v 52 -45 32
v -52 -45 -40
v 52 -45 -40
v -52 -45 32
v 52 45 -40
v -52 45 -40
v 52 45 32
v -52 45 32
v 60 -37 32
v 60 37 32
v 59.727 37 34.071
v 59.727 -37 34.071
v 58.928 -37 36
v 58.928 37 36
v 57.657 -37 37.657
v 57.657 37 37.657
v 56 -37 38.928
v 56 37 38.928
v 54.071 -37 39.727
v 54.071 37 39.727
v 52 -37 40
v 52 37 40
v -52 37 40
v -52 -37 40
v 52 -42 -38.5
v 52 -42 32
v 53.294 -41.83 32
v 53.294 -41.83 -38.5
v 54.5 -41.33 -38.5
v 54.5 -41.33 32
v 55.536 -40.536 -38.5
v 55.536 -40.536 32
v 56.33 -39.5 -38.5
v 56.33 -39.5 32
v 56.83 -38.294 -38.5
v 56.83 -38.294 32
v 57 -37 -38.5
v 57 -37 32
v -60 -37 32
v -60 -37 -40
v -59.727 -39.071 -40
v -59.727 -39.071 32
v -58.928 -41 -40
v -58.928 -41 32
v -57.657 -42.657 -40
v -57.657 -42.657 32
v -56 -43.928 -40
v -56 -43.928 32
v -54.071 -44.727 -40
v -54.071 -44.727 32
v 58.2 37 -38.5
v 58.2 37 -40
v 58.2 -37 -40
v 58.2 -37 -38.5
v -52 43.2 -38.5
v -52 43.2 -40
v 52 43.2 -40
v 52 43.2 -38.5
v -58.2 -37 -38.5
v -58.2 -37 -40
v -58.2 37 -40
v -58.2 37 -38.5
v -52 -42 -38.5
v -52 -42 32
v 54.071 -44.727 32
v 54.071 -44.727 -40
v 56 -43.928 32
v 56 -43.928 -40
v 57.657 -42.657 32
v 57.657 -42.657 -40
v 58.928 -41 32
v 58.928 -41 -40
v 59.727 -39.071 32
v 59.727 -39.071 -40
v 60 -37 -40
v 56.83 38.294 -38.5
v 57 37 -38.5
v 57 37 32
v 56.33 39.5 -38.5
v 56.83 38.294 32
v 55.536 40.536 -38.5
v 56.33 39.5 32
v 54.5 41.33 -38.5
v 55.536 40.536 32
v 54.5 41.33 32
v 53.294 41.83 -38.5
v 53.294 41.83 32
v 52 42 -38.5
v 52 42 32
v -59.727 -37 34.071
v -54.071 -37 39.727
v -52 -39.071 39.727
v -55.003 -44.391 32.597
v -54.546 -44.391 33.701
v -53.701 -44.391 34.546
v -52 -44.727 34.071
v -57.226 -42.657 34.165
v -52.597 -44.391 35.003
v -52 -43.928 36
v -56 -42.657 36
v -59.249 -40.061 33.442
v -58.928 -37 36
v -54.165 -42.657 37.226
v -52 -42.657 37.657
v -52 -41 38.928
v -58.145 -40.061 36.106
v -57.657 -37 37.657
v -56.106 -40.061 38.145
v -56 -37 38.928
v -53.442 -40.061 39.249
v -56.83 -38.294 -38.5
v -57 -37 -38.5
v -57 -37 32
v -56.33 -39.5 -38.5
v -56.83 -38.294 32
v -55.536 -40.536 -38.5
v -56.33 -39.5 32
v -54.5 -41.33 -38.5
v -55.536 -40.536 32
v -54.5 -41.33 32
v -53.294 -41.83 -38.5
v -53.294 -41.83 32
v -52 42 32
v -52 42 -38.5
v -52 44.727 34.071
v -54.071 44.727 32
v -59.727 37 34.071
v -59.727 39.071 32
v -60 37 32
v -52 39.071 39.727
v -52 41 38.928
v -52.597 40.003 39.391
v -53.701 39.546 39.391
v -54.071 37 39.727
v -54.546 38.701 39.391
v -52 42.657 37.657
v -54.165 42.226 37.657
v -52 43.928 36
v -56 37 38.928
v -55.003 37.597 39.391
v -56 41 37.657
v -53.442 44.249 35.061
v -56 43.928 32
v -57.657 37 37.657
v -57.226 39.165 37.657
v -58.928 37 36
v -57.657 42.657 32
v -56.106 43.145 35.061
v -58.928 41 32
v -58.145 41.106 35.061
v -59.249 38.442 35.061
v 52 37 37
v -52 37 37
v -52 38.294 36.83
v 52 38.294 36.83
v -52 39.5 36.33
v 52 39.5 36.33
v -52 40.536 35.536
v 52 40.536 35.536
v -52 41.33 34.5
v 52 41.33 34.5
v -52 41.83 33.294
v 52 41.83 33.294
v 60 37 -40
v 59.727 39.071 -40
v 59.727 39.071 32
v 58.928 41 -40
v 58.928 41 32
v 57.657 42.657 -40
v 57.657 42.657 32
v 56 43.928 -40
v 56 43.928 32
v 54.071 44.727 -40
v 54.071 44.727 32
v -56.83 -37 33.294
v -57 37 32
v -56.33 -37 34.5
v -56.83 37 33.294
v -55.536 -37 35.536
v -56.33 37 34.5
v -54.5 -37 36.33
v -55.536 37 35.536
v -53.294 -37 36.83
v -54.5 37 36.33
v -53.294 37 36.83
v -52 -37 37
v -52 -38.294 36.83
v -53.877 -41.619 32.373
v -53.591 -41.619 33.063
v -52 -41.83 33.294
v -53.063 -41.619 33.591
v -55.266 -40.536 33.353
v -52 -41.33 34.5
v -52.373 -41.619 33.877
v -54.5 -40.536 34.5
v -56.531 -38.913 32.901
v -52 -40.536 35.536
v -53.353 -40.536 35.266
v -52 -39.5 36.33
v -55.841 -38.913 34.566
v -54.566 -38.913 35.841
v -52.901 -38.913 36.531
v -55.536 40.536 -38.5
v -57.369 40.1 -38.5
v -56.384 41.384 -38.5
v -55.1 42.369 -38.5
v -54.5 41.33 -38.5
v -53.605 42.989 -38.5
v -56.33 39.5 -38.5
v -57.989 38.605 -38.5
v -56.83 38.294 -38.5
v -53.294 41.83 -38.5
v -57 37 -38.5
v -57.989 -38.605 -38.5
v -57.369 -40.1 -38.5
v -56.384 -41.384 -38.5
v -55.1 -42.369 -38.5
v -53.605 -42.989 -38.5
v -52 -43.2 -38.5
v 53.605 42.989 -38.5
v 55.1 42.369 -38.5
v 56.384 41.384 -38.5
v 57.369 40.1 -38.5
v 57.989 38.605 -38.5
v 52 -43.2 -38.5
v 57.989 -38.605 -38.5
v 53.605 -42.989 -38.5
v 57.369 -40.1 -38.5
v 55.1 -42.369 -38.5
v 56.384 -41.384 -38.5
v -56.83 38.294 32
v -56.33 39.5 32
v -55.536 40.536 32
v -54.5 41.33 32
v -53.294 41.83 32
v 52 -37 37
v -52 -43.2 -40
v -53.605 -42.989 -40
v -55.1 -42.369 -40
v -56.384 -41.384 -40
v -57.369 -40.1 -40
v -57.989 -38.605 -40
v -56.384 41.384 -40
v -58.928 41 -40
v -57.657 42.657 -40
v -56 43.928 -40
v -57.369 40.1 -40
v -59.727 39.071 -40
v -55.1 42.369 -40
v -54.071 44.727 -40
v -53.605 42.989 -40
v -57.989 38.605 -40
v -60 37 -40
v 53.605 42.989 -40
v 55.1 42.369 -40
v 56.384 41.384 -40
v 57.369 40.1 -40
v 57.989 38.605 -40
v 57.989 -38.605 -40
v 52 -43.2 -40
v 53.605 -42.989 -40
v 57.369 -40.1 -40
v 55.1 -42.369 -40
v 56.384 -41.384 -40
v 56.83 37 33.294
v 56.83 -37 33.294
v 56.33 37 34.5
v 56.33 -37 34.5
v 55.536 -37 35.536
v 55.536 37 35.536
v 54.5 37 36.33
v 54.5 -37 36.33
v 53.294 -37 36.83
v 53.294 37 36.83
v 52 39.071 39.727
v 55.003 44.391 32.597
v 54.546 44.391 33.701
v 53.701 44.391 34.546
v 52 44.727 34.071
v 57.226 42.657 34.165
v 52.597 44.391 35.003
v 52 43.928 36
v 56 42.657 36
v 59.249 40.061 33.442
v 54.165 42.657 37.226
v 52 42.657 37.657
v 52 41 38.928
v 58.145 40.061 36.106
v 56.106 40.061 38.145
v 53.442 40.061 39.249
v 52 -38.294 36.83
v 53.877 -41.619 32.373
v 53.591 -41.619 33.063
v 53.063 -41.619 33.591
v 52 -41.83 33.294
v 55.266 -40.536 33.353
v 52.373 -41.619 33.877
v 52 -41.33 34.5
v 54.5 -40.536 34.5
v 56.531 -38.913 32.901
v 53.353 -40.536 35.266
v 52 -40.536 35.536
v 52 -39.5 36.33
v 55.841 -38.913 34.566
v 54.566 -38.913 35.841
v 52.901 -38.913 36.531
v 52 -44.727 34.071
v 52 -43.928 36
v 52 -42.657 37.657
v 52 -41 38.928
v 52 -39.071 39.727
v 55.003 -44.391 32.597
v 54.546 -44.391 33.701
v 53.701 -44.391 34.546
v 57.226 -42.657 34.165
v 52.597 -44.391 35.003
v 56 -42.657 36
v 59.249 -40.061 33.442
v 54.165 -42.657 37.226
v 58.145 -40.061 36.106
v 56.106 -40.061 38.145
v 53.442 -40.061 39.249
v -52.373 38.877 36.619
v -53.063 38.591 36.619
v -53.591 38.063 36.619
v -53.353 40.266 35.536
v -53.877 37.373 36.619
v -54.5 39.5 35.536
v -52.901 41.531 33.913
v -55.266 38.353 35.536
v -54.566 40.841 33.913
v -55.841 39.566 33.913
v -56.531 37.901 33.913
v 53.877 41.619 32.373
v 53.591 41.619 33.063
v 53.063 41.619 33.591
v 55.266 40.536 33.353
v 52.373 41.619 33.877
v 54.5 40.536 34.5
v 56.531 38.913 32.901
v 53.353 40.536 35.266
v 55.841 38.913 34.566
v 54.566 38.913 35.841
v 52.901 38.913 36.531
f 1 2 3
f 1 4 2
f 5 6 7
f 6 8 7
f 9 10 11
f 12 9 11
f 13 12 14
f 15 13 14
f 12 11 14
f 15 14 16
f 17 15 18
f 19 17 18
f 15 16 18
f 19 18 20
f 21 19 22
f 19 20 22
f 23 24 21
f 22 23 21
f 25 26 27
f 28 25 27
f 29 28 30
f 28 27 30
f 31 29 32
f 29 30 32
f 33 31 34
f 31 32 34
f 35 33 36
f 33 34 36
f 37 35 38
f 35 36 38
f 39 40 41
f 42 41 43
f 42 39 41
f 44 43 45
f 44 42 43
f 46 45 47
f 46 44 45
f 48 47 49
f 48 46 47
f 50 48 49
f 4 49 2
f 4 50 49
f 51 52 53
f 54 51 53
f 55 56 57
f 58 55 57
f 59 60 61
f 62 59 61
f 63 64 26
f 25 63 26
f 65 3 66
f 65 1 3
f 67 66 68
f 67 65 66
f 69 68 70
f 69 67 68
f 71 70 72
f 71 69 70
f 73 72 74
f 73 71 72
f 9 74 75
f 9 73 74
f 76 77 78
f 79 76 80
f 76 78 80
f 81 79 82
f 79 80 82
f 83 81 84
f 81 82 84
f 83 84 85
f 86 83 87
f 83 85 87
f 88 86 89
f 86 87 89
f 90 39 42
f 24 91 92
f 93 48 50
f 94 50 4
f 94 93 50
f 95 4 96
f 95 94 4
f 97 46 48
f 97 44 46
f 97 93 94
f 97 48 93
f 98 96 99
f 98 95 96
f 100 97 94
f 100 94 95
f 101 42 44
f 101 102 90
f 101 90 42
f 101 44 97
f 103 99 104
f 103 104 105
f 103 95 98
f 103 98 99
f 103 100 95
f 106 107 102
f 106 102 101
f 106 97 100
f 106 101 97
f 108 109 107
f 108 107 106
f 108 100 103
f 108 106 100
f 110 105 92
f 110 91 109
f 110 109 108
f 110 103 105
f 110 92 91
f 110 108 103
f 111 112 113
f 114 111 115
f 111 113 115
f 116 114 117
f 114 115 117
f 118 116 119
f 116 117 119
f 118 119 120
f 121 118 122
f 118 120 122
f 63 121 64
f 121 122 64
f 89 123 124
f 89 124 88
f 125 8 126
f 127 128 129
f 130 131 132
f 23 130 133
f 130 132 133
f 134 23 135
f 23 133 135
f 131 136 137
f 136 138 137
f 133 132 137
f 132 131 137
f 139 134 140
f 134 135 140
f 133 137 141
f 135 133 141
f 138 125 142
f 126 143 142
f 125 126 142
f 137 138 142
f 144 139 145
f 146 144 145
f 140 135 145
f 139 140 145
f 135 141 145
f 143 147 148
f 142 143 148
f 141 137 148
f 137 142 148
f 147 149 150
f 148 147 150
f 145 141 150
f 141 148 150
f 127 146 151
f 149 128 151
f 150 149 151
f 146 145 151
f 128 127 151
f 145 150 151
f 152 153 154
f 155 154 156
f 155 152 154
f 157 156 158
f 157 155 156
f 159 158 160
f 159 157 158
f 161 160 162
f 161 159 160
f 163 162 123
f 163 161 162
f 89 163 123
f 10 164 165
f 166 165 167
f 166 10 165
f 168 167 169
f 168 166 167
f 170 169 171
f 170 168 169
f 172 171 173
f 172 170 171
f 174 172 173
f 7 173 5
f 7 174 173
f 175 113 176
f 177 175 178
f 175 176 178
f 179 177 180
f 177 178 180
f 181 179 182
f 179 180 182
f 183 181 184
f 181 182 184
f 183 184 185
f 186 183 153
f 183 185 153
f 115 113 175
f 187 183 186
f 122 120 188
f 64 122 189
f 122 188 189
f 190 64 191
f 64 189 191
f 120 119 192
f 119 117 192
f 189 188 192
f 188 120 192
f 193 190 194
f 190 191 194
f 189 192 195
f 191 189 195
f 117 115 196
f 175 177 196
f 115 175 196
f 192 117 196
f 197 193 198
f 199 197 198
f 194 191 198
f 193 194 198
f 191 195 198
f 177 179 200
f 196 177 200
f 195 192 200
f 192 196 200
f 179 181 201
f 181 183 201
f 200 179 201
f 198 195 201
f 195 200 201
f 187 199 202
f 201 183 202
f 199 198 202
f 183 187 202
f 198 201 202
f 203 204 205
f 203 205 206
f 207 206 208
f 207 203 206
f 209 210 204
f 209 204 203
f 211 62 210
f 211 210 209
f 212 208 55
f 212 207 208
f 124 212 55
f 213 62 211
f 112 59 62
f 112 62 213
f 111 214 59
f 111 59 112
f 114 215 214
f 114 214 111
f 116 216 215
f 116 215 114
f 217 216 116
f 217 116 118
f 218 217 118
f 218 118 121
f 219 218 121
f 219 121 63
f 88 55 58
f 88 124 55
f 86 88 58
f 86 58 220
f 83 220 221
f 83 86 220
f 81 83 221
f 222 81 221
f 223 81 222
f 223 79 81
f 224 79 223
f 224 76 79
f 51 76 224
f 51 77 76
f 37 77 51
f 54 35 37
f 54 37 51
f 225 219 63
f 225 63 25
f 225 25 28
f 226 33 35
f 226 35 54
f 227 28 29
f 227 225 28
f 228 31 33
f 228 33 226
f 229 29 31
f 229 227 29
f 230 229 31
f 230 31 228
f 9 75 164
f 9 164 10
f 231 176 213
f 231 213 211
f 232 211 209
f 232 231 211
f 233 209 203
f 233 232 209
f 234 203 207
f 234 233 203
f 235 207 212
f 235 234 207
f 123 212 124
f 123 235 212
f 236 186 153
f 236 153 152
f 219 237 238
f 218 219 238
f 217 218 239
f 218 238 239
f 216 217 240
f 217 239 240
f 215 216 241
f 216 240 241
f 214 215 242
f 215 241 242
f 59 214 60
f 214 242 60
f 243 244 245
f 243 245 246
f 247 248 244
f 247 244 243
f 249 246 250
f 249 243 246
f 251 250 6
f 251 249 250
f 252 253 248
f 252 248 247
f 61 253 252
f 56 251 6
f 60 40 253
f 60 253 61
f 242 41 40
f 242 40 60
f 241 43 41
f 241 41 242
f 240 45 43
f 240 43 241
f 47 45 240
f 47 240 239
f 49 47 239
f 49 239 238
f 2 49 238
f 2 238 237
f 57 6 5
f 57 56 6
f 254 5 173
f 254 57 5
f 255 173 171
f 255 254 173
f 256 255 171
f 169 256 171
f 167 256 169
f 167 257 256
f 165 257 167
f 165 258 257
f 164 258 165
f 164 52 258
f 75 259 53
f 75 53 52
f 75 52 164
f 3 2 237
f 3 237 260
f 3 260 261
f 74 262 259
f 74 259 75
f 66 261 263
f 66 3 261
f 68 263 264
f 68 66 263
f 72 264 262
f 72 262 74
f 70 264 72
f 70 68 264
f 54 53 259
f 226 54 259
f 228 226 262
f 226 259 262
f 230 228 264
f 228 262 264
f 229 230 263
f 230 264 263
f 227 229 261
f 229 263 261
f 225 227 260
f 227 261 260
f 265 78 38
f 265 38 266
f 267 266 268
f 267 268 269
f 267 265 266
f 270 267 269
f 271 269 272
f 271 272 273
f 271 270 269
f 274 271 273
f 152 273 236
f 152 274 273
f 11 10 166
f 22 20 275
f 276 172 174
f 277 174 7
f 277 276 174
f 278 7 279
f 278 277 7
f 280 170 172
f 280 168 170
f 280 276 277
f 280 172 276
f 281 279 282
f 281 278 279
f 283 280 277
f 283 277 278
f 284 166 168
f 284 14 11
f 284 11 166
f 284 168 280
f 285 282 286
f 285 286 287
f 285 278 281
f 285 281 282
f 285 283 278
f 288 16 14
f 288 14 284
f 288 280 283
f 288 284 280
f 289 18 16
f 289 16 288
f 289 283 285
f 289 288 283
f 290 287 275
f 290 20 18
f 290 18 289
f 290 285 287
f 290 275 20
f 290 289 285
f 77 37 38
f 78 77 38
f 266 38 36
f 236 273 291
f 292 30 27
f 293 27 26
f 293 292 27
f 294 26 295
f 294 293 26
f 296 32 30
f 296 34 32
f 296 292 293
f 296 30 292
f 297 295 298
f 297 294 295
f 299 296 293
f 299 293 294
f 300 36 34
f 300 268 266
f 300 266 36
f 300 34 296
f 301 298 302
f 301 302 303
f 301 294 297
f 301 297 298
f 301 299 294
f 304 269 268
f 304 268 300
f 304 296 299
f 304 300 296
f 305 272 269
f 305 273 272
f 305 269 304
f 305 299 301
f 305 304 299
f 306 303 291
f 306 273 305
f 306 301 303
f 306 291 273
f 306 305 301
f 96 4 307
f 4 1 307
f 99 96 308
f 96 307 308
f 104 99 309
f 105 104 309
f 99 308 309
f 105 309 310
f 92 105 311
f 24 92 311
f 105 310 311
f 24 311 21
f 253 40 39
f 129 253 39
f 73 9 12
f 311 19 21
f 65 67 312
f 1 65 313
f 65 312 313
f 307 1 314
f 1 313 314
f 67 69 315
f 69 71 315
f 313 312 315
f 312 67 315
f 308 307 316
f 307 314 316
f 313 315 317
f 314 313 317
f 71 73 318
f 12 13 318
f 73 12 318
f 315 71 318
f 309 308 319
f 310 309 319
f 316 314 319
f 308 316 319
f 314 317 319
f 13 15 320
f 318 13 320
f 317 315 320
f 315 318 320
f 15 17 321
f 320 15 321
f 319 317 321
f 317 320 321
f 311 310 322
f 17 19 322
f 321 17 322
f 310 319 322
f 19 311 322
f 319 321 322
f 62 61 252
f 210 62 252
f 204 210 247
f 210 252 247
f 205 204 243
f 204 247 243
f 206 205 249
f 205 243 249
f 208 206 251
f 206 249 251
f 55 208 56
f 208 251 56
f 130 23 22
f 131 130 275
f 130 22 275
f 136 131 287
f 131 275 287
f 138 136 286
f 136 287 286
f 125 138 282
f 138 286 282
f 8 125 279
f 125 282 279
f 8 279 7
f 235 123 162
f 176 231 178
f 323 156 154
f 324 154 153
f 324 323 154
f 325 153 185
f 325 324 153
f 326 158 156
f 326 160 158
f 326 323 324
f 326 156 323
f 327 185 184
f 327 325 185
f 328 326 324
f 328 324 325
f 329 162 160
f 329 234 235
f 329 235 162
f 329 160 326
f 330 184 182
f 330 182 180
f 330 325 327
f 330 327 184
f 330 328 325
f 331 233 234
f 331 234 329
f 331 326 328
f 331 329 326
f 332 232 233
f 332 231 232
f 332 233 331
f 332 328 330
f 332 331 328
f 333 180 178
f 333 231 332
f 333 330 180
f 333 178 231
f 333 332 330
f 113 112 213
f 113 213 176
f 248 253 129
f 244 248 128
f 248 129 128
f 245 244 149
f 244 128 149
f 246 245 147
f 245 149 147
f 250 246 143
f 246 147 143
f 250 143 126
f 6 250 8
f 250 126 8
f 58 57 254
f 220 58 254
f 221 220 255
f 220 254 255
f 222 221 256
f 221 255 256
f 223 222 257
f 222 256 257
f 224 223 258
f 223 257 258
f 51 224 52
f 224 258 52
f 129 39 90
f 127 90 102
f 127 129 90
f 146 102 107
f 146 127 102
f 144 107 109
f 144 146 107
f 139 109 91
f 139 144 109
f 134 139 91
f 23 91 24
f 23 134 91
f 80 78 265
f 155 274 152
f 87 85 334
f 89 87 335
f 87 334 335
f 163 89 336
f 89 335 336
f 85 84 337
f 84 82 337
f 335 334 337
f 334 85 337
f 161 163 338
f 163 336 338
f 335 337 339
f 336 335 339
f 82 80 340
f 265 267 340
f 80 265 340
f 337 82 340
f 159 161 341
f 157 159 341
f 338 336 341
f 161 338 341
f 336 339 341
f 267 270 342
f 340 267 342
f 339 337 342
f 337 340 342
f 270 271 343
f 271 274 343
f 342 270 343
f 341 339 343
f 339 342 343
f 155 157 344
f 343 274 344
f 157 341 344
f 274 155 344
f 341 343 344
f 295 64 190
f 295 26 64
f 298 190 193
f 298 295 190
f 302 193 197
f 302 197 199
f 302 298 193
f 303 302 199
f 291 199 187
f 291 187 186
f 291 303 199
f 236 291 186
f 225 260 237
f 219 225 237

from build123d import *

# Parameters (mm, degrees)
F0_W     = 120
F0_H     = 80
F1_DEPTH = 45
F2_R     = 8
F3_T     = -3
F5_DEPTH = 1.5


with BuildPart() as f1:
    # F0 (on Front) → F1 (new body, symmetric)
    with BuildSketch(Plane.XZ):
        Rectangle(F0_W, F0_H)
    extrude(amount=F1_DEPTH, both=True)

    # F2
    f2_edges = [f1.edges().sort_by_distance(p)[0] for p in [
        (60, 0, 40),
        (60, -45, 0),
        (60, 45, 0),
        (-60, 45, 0),
        (0, 45, 40),
        (-60, 0, 40),
        (-60, -45, 0),
        (0, -45, 40),
    ]]
    fillet(f2_edges, radius=F2_R)

    # F3
    f3_openings = [f1.faces().sort_by_distance(p)[0] for p in [
        (0, 0, -40),
    ]]
    offset(amount=F3_T, openings=f3_openings)

    # F4 (on face) → F5 (cut)
    with BuildSketch(Plane(origin=(0, 0, -40), x_dir=(1, 0, 0), z_dir=(0, 0, -1))):
        with BuildLine():
            Line((52, 43.2), (-52, 43.2))
            ThreePointArc((-52, 43.2), (-56.3840620434, 41.3840620434), (-58.2, 37))
            Line((-58.2, 37), (-58.2, -37))
            ThreePointArc((-58.2, -37), (-56.3840620434, -41.3840620434), (-52, -43.2))
            Line((-52, -43.2), (52, -43.2))
            ThreePointArc((52, -43.2), (56.3840620434, -41.3840620434), (58.2, -37))
            Line((58.2, -37), (58.2, 37))
            ThreePointArc((58.2, 37), (56.3840620434, 41.3840620434), (52, 43.2))
        make_face()
    extrude(amount=-F5_DEPTH, mode=Mode.SUBTRACT)


solid = f1.part
